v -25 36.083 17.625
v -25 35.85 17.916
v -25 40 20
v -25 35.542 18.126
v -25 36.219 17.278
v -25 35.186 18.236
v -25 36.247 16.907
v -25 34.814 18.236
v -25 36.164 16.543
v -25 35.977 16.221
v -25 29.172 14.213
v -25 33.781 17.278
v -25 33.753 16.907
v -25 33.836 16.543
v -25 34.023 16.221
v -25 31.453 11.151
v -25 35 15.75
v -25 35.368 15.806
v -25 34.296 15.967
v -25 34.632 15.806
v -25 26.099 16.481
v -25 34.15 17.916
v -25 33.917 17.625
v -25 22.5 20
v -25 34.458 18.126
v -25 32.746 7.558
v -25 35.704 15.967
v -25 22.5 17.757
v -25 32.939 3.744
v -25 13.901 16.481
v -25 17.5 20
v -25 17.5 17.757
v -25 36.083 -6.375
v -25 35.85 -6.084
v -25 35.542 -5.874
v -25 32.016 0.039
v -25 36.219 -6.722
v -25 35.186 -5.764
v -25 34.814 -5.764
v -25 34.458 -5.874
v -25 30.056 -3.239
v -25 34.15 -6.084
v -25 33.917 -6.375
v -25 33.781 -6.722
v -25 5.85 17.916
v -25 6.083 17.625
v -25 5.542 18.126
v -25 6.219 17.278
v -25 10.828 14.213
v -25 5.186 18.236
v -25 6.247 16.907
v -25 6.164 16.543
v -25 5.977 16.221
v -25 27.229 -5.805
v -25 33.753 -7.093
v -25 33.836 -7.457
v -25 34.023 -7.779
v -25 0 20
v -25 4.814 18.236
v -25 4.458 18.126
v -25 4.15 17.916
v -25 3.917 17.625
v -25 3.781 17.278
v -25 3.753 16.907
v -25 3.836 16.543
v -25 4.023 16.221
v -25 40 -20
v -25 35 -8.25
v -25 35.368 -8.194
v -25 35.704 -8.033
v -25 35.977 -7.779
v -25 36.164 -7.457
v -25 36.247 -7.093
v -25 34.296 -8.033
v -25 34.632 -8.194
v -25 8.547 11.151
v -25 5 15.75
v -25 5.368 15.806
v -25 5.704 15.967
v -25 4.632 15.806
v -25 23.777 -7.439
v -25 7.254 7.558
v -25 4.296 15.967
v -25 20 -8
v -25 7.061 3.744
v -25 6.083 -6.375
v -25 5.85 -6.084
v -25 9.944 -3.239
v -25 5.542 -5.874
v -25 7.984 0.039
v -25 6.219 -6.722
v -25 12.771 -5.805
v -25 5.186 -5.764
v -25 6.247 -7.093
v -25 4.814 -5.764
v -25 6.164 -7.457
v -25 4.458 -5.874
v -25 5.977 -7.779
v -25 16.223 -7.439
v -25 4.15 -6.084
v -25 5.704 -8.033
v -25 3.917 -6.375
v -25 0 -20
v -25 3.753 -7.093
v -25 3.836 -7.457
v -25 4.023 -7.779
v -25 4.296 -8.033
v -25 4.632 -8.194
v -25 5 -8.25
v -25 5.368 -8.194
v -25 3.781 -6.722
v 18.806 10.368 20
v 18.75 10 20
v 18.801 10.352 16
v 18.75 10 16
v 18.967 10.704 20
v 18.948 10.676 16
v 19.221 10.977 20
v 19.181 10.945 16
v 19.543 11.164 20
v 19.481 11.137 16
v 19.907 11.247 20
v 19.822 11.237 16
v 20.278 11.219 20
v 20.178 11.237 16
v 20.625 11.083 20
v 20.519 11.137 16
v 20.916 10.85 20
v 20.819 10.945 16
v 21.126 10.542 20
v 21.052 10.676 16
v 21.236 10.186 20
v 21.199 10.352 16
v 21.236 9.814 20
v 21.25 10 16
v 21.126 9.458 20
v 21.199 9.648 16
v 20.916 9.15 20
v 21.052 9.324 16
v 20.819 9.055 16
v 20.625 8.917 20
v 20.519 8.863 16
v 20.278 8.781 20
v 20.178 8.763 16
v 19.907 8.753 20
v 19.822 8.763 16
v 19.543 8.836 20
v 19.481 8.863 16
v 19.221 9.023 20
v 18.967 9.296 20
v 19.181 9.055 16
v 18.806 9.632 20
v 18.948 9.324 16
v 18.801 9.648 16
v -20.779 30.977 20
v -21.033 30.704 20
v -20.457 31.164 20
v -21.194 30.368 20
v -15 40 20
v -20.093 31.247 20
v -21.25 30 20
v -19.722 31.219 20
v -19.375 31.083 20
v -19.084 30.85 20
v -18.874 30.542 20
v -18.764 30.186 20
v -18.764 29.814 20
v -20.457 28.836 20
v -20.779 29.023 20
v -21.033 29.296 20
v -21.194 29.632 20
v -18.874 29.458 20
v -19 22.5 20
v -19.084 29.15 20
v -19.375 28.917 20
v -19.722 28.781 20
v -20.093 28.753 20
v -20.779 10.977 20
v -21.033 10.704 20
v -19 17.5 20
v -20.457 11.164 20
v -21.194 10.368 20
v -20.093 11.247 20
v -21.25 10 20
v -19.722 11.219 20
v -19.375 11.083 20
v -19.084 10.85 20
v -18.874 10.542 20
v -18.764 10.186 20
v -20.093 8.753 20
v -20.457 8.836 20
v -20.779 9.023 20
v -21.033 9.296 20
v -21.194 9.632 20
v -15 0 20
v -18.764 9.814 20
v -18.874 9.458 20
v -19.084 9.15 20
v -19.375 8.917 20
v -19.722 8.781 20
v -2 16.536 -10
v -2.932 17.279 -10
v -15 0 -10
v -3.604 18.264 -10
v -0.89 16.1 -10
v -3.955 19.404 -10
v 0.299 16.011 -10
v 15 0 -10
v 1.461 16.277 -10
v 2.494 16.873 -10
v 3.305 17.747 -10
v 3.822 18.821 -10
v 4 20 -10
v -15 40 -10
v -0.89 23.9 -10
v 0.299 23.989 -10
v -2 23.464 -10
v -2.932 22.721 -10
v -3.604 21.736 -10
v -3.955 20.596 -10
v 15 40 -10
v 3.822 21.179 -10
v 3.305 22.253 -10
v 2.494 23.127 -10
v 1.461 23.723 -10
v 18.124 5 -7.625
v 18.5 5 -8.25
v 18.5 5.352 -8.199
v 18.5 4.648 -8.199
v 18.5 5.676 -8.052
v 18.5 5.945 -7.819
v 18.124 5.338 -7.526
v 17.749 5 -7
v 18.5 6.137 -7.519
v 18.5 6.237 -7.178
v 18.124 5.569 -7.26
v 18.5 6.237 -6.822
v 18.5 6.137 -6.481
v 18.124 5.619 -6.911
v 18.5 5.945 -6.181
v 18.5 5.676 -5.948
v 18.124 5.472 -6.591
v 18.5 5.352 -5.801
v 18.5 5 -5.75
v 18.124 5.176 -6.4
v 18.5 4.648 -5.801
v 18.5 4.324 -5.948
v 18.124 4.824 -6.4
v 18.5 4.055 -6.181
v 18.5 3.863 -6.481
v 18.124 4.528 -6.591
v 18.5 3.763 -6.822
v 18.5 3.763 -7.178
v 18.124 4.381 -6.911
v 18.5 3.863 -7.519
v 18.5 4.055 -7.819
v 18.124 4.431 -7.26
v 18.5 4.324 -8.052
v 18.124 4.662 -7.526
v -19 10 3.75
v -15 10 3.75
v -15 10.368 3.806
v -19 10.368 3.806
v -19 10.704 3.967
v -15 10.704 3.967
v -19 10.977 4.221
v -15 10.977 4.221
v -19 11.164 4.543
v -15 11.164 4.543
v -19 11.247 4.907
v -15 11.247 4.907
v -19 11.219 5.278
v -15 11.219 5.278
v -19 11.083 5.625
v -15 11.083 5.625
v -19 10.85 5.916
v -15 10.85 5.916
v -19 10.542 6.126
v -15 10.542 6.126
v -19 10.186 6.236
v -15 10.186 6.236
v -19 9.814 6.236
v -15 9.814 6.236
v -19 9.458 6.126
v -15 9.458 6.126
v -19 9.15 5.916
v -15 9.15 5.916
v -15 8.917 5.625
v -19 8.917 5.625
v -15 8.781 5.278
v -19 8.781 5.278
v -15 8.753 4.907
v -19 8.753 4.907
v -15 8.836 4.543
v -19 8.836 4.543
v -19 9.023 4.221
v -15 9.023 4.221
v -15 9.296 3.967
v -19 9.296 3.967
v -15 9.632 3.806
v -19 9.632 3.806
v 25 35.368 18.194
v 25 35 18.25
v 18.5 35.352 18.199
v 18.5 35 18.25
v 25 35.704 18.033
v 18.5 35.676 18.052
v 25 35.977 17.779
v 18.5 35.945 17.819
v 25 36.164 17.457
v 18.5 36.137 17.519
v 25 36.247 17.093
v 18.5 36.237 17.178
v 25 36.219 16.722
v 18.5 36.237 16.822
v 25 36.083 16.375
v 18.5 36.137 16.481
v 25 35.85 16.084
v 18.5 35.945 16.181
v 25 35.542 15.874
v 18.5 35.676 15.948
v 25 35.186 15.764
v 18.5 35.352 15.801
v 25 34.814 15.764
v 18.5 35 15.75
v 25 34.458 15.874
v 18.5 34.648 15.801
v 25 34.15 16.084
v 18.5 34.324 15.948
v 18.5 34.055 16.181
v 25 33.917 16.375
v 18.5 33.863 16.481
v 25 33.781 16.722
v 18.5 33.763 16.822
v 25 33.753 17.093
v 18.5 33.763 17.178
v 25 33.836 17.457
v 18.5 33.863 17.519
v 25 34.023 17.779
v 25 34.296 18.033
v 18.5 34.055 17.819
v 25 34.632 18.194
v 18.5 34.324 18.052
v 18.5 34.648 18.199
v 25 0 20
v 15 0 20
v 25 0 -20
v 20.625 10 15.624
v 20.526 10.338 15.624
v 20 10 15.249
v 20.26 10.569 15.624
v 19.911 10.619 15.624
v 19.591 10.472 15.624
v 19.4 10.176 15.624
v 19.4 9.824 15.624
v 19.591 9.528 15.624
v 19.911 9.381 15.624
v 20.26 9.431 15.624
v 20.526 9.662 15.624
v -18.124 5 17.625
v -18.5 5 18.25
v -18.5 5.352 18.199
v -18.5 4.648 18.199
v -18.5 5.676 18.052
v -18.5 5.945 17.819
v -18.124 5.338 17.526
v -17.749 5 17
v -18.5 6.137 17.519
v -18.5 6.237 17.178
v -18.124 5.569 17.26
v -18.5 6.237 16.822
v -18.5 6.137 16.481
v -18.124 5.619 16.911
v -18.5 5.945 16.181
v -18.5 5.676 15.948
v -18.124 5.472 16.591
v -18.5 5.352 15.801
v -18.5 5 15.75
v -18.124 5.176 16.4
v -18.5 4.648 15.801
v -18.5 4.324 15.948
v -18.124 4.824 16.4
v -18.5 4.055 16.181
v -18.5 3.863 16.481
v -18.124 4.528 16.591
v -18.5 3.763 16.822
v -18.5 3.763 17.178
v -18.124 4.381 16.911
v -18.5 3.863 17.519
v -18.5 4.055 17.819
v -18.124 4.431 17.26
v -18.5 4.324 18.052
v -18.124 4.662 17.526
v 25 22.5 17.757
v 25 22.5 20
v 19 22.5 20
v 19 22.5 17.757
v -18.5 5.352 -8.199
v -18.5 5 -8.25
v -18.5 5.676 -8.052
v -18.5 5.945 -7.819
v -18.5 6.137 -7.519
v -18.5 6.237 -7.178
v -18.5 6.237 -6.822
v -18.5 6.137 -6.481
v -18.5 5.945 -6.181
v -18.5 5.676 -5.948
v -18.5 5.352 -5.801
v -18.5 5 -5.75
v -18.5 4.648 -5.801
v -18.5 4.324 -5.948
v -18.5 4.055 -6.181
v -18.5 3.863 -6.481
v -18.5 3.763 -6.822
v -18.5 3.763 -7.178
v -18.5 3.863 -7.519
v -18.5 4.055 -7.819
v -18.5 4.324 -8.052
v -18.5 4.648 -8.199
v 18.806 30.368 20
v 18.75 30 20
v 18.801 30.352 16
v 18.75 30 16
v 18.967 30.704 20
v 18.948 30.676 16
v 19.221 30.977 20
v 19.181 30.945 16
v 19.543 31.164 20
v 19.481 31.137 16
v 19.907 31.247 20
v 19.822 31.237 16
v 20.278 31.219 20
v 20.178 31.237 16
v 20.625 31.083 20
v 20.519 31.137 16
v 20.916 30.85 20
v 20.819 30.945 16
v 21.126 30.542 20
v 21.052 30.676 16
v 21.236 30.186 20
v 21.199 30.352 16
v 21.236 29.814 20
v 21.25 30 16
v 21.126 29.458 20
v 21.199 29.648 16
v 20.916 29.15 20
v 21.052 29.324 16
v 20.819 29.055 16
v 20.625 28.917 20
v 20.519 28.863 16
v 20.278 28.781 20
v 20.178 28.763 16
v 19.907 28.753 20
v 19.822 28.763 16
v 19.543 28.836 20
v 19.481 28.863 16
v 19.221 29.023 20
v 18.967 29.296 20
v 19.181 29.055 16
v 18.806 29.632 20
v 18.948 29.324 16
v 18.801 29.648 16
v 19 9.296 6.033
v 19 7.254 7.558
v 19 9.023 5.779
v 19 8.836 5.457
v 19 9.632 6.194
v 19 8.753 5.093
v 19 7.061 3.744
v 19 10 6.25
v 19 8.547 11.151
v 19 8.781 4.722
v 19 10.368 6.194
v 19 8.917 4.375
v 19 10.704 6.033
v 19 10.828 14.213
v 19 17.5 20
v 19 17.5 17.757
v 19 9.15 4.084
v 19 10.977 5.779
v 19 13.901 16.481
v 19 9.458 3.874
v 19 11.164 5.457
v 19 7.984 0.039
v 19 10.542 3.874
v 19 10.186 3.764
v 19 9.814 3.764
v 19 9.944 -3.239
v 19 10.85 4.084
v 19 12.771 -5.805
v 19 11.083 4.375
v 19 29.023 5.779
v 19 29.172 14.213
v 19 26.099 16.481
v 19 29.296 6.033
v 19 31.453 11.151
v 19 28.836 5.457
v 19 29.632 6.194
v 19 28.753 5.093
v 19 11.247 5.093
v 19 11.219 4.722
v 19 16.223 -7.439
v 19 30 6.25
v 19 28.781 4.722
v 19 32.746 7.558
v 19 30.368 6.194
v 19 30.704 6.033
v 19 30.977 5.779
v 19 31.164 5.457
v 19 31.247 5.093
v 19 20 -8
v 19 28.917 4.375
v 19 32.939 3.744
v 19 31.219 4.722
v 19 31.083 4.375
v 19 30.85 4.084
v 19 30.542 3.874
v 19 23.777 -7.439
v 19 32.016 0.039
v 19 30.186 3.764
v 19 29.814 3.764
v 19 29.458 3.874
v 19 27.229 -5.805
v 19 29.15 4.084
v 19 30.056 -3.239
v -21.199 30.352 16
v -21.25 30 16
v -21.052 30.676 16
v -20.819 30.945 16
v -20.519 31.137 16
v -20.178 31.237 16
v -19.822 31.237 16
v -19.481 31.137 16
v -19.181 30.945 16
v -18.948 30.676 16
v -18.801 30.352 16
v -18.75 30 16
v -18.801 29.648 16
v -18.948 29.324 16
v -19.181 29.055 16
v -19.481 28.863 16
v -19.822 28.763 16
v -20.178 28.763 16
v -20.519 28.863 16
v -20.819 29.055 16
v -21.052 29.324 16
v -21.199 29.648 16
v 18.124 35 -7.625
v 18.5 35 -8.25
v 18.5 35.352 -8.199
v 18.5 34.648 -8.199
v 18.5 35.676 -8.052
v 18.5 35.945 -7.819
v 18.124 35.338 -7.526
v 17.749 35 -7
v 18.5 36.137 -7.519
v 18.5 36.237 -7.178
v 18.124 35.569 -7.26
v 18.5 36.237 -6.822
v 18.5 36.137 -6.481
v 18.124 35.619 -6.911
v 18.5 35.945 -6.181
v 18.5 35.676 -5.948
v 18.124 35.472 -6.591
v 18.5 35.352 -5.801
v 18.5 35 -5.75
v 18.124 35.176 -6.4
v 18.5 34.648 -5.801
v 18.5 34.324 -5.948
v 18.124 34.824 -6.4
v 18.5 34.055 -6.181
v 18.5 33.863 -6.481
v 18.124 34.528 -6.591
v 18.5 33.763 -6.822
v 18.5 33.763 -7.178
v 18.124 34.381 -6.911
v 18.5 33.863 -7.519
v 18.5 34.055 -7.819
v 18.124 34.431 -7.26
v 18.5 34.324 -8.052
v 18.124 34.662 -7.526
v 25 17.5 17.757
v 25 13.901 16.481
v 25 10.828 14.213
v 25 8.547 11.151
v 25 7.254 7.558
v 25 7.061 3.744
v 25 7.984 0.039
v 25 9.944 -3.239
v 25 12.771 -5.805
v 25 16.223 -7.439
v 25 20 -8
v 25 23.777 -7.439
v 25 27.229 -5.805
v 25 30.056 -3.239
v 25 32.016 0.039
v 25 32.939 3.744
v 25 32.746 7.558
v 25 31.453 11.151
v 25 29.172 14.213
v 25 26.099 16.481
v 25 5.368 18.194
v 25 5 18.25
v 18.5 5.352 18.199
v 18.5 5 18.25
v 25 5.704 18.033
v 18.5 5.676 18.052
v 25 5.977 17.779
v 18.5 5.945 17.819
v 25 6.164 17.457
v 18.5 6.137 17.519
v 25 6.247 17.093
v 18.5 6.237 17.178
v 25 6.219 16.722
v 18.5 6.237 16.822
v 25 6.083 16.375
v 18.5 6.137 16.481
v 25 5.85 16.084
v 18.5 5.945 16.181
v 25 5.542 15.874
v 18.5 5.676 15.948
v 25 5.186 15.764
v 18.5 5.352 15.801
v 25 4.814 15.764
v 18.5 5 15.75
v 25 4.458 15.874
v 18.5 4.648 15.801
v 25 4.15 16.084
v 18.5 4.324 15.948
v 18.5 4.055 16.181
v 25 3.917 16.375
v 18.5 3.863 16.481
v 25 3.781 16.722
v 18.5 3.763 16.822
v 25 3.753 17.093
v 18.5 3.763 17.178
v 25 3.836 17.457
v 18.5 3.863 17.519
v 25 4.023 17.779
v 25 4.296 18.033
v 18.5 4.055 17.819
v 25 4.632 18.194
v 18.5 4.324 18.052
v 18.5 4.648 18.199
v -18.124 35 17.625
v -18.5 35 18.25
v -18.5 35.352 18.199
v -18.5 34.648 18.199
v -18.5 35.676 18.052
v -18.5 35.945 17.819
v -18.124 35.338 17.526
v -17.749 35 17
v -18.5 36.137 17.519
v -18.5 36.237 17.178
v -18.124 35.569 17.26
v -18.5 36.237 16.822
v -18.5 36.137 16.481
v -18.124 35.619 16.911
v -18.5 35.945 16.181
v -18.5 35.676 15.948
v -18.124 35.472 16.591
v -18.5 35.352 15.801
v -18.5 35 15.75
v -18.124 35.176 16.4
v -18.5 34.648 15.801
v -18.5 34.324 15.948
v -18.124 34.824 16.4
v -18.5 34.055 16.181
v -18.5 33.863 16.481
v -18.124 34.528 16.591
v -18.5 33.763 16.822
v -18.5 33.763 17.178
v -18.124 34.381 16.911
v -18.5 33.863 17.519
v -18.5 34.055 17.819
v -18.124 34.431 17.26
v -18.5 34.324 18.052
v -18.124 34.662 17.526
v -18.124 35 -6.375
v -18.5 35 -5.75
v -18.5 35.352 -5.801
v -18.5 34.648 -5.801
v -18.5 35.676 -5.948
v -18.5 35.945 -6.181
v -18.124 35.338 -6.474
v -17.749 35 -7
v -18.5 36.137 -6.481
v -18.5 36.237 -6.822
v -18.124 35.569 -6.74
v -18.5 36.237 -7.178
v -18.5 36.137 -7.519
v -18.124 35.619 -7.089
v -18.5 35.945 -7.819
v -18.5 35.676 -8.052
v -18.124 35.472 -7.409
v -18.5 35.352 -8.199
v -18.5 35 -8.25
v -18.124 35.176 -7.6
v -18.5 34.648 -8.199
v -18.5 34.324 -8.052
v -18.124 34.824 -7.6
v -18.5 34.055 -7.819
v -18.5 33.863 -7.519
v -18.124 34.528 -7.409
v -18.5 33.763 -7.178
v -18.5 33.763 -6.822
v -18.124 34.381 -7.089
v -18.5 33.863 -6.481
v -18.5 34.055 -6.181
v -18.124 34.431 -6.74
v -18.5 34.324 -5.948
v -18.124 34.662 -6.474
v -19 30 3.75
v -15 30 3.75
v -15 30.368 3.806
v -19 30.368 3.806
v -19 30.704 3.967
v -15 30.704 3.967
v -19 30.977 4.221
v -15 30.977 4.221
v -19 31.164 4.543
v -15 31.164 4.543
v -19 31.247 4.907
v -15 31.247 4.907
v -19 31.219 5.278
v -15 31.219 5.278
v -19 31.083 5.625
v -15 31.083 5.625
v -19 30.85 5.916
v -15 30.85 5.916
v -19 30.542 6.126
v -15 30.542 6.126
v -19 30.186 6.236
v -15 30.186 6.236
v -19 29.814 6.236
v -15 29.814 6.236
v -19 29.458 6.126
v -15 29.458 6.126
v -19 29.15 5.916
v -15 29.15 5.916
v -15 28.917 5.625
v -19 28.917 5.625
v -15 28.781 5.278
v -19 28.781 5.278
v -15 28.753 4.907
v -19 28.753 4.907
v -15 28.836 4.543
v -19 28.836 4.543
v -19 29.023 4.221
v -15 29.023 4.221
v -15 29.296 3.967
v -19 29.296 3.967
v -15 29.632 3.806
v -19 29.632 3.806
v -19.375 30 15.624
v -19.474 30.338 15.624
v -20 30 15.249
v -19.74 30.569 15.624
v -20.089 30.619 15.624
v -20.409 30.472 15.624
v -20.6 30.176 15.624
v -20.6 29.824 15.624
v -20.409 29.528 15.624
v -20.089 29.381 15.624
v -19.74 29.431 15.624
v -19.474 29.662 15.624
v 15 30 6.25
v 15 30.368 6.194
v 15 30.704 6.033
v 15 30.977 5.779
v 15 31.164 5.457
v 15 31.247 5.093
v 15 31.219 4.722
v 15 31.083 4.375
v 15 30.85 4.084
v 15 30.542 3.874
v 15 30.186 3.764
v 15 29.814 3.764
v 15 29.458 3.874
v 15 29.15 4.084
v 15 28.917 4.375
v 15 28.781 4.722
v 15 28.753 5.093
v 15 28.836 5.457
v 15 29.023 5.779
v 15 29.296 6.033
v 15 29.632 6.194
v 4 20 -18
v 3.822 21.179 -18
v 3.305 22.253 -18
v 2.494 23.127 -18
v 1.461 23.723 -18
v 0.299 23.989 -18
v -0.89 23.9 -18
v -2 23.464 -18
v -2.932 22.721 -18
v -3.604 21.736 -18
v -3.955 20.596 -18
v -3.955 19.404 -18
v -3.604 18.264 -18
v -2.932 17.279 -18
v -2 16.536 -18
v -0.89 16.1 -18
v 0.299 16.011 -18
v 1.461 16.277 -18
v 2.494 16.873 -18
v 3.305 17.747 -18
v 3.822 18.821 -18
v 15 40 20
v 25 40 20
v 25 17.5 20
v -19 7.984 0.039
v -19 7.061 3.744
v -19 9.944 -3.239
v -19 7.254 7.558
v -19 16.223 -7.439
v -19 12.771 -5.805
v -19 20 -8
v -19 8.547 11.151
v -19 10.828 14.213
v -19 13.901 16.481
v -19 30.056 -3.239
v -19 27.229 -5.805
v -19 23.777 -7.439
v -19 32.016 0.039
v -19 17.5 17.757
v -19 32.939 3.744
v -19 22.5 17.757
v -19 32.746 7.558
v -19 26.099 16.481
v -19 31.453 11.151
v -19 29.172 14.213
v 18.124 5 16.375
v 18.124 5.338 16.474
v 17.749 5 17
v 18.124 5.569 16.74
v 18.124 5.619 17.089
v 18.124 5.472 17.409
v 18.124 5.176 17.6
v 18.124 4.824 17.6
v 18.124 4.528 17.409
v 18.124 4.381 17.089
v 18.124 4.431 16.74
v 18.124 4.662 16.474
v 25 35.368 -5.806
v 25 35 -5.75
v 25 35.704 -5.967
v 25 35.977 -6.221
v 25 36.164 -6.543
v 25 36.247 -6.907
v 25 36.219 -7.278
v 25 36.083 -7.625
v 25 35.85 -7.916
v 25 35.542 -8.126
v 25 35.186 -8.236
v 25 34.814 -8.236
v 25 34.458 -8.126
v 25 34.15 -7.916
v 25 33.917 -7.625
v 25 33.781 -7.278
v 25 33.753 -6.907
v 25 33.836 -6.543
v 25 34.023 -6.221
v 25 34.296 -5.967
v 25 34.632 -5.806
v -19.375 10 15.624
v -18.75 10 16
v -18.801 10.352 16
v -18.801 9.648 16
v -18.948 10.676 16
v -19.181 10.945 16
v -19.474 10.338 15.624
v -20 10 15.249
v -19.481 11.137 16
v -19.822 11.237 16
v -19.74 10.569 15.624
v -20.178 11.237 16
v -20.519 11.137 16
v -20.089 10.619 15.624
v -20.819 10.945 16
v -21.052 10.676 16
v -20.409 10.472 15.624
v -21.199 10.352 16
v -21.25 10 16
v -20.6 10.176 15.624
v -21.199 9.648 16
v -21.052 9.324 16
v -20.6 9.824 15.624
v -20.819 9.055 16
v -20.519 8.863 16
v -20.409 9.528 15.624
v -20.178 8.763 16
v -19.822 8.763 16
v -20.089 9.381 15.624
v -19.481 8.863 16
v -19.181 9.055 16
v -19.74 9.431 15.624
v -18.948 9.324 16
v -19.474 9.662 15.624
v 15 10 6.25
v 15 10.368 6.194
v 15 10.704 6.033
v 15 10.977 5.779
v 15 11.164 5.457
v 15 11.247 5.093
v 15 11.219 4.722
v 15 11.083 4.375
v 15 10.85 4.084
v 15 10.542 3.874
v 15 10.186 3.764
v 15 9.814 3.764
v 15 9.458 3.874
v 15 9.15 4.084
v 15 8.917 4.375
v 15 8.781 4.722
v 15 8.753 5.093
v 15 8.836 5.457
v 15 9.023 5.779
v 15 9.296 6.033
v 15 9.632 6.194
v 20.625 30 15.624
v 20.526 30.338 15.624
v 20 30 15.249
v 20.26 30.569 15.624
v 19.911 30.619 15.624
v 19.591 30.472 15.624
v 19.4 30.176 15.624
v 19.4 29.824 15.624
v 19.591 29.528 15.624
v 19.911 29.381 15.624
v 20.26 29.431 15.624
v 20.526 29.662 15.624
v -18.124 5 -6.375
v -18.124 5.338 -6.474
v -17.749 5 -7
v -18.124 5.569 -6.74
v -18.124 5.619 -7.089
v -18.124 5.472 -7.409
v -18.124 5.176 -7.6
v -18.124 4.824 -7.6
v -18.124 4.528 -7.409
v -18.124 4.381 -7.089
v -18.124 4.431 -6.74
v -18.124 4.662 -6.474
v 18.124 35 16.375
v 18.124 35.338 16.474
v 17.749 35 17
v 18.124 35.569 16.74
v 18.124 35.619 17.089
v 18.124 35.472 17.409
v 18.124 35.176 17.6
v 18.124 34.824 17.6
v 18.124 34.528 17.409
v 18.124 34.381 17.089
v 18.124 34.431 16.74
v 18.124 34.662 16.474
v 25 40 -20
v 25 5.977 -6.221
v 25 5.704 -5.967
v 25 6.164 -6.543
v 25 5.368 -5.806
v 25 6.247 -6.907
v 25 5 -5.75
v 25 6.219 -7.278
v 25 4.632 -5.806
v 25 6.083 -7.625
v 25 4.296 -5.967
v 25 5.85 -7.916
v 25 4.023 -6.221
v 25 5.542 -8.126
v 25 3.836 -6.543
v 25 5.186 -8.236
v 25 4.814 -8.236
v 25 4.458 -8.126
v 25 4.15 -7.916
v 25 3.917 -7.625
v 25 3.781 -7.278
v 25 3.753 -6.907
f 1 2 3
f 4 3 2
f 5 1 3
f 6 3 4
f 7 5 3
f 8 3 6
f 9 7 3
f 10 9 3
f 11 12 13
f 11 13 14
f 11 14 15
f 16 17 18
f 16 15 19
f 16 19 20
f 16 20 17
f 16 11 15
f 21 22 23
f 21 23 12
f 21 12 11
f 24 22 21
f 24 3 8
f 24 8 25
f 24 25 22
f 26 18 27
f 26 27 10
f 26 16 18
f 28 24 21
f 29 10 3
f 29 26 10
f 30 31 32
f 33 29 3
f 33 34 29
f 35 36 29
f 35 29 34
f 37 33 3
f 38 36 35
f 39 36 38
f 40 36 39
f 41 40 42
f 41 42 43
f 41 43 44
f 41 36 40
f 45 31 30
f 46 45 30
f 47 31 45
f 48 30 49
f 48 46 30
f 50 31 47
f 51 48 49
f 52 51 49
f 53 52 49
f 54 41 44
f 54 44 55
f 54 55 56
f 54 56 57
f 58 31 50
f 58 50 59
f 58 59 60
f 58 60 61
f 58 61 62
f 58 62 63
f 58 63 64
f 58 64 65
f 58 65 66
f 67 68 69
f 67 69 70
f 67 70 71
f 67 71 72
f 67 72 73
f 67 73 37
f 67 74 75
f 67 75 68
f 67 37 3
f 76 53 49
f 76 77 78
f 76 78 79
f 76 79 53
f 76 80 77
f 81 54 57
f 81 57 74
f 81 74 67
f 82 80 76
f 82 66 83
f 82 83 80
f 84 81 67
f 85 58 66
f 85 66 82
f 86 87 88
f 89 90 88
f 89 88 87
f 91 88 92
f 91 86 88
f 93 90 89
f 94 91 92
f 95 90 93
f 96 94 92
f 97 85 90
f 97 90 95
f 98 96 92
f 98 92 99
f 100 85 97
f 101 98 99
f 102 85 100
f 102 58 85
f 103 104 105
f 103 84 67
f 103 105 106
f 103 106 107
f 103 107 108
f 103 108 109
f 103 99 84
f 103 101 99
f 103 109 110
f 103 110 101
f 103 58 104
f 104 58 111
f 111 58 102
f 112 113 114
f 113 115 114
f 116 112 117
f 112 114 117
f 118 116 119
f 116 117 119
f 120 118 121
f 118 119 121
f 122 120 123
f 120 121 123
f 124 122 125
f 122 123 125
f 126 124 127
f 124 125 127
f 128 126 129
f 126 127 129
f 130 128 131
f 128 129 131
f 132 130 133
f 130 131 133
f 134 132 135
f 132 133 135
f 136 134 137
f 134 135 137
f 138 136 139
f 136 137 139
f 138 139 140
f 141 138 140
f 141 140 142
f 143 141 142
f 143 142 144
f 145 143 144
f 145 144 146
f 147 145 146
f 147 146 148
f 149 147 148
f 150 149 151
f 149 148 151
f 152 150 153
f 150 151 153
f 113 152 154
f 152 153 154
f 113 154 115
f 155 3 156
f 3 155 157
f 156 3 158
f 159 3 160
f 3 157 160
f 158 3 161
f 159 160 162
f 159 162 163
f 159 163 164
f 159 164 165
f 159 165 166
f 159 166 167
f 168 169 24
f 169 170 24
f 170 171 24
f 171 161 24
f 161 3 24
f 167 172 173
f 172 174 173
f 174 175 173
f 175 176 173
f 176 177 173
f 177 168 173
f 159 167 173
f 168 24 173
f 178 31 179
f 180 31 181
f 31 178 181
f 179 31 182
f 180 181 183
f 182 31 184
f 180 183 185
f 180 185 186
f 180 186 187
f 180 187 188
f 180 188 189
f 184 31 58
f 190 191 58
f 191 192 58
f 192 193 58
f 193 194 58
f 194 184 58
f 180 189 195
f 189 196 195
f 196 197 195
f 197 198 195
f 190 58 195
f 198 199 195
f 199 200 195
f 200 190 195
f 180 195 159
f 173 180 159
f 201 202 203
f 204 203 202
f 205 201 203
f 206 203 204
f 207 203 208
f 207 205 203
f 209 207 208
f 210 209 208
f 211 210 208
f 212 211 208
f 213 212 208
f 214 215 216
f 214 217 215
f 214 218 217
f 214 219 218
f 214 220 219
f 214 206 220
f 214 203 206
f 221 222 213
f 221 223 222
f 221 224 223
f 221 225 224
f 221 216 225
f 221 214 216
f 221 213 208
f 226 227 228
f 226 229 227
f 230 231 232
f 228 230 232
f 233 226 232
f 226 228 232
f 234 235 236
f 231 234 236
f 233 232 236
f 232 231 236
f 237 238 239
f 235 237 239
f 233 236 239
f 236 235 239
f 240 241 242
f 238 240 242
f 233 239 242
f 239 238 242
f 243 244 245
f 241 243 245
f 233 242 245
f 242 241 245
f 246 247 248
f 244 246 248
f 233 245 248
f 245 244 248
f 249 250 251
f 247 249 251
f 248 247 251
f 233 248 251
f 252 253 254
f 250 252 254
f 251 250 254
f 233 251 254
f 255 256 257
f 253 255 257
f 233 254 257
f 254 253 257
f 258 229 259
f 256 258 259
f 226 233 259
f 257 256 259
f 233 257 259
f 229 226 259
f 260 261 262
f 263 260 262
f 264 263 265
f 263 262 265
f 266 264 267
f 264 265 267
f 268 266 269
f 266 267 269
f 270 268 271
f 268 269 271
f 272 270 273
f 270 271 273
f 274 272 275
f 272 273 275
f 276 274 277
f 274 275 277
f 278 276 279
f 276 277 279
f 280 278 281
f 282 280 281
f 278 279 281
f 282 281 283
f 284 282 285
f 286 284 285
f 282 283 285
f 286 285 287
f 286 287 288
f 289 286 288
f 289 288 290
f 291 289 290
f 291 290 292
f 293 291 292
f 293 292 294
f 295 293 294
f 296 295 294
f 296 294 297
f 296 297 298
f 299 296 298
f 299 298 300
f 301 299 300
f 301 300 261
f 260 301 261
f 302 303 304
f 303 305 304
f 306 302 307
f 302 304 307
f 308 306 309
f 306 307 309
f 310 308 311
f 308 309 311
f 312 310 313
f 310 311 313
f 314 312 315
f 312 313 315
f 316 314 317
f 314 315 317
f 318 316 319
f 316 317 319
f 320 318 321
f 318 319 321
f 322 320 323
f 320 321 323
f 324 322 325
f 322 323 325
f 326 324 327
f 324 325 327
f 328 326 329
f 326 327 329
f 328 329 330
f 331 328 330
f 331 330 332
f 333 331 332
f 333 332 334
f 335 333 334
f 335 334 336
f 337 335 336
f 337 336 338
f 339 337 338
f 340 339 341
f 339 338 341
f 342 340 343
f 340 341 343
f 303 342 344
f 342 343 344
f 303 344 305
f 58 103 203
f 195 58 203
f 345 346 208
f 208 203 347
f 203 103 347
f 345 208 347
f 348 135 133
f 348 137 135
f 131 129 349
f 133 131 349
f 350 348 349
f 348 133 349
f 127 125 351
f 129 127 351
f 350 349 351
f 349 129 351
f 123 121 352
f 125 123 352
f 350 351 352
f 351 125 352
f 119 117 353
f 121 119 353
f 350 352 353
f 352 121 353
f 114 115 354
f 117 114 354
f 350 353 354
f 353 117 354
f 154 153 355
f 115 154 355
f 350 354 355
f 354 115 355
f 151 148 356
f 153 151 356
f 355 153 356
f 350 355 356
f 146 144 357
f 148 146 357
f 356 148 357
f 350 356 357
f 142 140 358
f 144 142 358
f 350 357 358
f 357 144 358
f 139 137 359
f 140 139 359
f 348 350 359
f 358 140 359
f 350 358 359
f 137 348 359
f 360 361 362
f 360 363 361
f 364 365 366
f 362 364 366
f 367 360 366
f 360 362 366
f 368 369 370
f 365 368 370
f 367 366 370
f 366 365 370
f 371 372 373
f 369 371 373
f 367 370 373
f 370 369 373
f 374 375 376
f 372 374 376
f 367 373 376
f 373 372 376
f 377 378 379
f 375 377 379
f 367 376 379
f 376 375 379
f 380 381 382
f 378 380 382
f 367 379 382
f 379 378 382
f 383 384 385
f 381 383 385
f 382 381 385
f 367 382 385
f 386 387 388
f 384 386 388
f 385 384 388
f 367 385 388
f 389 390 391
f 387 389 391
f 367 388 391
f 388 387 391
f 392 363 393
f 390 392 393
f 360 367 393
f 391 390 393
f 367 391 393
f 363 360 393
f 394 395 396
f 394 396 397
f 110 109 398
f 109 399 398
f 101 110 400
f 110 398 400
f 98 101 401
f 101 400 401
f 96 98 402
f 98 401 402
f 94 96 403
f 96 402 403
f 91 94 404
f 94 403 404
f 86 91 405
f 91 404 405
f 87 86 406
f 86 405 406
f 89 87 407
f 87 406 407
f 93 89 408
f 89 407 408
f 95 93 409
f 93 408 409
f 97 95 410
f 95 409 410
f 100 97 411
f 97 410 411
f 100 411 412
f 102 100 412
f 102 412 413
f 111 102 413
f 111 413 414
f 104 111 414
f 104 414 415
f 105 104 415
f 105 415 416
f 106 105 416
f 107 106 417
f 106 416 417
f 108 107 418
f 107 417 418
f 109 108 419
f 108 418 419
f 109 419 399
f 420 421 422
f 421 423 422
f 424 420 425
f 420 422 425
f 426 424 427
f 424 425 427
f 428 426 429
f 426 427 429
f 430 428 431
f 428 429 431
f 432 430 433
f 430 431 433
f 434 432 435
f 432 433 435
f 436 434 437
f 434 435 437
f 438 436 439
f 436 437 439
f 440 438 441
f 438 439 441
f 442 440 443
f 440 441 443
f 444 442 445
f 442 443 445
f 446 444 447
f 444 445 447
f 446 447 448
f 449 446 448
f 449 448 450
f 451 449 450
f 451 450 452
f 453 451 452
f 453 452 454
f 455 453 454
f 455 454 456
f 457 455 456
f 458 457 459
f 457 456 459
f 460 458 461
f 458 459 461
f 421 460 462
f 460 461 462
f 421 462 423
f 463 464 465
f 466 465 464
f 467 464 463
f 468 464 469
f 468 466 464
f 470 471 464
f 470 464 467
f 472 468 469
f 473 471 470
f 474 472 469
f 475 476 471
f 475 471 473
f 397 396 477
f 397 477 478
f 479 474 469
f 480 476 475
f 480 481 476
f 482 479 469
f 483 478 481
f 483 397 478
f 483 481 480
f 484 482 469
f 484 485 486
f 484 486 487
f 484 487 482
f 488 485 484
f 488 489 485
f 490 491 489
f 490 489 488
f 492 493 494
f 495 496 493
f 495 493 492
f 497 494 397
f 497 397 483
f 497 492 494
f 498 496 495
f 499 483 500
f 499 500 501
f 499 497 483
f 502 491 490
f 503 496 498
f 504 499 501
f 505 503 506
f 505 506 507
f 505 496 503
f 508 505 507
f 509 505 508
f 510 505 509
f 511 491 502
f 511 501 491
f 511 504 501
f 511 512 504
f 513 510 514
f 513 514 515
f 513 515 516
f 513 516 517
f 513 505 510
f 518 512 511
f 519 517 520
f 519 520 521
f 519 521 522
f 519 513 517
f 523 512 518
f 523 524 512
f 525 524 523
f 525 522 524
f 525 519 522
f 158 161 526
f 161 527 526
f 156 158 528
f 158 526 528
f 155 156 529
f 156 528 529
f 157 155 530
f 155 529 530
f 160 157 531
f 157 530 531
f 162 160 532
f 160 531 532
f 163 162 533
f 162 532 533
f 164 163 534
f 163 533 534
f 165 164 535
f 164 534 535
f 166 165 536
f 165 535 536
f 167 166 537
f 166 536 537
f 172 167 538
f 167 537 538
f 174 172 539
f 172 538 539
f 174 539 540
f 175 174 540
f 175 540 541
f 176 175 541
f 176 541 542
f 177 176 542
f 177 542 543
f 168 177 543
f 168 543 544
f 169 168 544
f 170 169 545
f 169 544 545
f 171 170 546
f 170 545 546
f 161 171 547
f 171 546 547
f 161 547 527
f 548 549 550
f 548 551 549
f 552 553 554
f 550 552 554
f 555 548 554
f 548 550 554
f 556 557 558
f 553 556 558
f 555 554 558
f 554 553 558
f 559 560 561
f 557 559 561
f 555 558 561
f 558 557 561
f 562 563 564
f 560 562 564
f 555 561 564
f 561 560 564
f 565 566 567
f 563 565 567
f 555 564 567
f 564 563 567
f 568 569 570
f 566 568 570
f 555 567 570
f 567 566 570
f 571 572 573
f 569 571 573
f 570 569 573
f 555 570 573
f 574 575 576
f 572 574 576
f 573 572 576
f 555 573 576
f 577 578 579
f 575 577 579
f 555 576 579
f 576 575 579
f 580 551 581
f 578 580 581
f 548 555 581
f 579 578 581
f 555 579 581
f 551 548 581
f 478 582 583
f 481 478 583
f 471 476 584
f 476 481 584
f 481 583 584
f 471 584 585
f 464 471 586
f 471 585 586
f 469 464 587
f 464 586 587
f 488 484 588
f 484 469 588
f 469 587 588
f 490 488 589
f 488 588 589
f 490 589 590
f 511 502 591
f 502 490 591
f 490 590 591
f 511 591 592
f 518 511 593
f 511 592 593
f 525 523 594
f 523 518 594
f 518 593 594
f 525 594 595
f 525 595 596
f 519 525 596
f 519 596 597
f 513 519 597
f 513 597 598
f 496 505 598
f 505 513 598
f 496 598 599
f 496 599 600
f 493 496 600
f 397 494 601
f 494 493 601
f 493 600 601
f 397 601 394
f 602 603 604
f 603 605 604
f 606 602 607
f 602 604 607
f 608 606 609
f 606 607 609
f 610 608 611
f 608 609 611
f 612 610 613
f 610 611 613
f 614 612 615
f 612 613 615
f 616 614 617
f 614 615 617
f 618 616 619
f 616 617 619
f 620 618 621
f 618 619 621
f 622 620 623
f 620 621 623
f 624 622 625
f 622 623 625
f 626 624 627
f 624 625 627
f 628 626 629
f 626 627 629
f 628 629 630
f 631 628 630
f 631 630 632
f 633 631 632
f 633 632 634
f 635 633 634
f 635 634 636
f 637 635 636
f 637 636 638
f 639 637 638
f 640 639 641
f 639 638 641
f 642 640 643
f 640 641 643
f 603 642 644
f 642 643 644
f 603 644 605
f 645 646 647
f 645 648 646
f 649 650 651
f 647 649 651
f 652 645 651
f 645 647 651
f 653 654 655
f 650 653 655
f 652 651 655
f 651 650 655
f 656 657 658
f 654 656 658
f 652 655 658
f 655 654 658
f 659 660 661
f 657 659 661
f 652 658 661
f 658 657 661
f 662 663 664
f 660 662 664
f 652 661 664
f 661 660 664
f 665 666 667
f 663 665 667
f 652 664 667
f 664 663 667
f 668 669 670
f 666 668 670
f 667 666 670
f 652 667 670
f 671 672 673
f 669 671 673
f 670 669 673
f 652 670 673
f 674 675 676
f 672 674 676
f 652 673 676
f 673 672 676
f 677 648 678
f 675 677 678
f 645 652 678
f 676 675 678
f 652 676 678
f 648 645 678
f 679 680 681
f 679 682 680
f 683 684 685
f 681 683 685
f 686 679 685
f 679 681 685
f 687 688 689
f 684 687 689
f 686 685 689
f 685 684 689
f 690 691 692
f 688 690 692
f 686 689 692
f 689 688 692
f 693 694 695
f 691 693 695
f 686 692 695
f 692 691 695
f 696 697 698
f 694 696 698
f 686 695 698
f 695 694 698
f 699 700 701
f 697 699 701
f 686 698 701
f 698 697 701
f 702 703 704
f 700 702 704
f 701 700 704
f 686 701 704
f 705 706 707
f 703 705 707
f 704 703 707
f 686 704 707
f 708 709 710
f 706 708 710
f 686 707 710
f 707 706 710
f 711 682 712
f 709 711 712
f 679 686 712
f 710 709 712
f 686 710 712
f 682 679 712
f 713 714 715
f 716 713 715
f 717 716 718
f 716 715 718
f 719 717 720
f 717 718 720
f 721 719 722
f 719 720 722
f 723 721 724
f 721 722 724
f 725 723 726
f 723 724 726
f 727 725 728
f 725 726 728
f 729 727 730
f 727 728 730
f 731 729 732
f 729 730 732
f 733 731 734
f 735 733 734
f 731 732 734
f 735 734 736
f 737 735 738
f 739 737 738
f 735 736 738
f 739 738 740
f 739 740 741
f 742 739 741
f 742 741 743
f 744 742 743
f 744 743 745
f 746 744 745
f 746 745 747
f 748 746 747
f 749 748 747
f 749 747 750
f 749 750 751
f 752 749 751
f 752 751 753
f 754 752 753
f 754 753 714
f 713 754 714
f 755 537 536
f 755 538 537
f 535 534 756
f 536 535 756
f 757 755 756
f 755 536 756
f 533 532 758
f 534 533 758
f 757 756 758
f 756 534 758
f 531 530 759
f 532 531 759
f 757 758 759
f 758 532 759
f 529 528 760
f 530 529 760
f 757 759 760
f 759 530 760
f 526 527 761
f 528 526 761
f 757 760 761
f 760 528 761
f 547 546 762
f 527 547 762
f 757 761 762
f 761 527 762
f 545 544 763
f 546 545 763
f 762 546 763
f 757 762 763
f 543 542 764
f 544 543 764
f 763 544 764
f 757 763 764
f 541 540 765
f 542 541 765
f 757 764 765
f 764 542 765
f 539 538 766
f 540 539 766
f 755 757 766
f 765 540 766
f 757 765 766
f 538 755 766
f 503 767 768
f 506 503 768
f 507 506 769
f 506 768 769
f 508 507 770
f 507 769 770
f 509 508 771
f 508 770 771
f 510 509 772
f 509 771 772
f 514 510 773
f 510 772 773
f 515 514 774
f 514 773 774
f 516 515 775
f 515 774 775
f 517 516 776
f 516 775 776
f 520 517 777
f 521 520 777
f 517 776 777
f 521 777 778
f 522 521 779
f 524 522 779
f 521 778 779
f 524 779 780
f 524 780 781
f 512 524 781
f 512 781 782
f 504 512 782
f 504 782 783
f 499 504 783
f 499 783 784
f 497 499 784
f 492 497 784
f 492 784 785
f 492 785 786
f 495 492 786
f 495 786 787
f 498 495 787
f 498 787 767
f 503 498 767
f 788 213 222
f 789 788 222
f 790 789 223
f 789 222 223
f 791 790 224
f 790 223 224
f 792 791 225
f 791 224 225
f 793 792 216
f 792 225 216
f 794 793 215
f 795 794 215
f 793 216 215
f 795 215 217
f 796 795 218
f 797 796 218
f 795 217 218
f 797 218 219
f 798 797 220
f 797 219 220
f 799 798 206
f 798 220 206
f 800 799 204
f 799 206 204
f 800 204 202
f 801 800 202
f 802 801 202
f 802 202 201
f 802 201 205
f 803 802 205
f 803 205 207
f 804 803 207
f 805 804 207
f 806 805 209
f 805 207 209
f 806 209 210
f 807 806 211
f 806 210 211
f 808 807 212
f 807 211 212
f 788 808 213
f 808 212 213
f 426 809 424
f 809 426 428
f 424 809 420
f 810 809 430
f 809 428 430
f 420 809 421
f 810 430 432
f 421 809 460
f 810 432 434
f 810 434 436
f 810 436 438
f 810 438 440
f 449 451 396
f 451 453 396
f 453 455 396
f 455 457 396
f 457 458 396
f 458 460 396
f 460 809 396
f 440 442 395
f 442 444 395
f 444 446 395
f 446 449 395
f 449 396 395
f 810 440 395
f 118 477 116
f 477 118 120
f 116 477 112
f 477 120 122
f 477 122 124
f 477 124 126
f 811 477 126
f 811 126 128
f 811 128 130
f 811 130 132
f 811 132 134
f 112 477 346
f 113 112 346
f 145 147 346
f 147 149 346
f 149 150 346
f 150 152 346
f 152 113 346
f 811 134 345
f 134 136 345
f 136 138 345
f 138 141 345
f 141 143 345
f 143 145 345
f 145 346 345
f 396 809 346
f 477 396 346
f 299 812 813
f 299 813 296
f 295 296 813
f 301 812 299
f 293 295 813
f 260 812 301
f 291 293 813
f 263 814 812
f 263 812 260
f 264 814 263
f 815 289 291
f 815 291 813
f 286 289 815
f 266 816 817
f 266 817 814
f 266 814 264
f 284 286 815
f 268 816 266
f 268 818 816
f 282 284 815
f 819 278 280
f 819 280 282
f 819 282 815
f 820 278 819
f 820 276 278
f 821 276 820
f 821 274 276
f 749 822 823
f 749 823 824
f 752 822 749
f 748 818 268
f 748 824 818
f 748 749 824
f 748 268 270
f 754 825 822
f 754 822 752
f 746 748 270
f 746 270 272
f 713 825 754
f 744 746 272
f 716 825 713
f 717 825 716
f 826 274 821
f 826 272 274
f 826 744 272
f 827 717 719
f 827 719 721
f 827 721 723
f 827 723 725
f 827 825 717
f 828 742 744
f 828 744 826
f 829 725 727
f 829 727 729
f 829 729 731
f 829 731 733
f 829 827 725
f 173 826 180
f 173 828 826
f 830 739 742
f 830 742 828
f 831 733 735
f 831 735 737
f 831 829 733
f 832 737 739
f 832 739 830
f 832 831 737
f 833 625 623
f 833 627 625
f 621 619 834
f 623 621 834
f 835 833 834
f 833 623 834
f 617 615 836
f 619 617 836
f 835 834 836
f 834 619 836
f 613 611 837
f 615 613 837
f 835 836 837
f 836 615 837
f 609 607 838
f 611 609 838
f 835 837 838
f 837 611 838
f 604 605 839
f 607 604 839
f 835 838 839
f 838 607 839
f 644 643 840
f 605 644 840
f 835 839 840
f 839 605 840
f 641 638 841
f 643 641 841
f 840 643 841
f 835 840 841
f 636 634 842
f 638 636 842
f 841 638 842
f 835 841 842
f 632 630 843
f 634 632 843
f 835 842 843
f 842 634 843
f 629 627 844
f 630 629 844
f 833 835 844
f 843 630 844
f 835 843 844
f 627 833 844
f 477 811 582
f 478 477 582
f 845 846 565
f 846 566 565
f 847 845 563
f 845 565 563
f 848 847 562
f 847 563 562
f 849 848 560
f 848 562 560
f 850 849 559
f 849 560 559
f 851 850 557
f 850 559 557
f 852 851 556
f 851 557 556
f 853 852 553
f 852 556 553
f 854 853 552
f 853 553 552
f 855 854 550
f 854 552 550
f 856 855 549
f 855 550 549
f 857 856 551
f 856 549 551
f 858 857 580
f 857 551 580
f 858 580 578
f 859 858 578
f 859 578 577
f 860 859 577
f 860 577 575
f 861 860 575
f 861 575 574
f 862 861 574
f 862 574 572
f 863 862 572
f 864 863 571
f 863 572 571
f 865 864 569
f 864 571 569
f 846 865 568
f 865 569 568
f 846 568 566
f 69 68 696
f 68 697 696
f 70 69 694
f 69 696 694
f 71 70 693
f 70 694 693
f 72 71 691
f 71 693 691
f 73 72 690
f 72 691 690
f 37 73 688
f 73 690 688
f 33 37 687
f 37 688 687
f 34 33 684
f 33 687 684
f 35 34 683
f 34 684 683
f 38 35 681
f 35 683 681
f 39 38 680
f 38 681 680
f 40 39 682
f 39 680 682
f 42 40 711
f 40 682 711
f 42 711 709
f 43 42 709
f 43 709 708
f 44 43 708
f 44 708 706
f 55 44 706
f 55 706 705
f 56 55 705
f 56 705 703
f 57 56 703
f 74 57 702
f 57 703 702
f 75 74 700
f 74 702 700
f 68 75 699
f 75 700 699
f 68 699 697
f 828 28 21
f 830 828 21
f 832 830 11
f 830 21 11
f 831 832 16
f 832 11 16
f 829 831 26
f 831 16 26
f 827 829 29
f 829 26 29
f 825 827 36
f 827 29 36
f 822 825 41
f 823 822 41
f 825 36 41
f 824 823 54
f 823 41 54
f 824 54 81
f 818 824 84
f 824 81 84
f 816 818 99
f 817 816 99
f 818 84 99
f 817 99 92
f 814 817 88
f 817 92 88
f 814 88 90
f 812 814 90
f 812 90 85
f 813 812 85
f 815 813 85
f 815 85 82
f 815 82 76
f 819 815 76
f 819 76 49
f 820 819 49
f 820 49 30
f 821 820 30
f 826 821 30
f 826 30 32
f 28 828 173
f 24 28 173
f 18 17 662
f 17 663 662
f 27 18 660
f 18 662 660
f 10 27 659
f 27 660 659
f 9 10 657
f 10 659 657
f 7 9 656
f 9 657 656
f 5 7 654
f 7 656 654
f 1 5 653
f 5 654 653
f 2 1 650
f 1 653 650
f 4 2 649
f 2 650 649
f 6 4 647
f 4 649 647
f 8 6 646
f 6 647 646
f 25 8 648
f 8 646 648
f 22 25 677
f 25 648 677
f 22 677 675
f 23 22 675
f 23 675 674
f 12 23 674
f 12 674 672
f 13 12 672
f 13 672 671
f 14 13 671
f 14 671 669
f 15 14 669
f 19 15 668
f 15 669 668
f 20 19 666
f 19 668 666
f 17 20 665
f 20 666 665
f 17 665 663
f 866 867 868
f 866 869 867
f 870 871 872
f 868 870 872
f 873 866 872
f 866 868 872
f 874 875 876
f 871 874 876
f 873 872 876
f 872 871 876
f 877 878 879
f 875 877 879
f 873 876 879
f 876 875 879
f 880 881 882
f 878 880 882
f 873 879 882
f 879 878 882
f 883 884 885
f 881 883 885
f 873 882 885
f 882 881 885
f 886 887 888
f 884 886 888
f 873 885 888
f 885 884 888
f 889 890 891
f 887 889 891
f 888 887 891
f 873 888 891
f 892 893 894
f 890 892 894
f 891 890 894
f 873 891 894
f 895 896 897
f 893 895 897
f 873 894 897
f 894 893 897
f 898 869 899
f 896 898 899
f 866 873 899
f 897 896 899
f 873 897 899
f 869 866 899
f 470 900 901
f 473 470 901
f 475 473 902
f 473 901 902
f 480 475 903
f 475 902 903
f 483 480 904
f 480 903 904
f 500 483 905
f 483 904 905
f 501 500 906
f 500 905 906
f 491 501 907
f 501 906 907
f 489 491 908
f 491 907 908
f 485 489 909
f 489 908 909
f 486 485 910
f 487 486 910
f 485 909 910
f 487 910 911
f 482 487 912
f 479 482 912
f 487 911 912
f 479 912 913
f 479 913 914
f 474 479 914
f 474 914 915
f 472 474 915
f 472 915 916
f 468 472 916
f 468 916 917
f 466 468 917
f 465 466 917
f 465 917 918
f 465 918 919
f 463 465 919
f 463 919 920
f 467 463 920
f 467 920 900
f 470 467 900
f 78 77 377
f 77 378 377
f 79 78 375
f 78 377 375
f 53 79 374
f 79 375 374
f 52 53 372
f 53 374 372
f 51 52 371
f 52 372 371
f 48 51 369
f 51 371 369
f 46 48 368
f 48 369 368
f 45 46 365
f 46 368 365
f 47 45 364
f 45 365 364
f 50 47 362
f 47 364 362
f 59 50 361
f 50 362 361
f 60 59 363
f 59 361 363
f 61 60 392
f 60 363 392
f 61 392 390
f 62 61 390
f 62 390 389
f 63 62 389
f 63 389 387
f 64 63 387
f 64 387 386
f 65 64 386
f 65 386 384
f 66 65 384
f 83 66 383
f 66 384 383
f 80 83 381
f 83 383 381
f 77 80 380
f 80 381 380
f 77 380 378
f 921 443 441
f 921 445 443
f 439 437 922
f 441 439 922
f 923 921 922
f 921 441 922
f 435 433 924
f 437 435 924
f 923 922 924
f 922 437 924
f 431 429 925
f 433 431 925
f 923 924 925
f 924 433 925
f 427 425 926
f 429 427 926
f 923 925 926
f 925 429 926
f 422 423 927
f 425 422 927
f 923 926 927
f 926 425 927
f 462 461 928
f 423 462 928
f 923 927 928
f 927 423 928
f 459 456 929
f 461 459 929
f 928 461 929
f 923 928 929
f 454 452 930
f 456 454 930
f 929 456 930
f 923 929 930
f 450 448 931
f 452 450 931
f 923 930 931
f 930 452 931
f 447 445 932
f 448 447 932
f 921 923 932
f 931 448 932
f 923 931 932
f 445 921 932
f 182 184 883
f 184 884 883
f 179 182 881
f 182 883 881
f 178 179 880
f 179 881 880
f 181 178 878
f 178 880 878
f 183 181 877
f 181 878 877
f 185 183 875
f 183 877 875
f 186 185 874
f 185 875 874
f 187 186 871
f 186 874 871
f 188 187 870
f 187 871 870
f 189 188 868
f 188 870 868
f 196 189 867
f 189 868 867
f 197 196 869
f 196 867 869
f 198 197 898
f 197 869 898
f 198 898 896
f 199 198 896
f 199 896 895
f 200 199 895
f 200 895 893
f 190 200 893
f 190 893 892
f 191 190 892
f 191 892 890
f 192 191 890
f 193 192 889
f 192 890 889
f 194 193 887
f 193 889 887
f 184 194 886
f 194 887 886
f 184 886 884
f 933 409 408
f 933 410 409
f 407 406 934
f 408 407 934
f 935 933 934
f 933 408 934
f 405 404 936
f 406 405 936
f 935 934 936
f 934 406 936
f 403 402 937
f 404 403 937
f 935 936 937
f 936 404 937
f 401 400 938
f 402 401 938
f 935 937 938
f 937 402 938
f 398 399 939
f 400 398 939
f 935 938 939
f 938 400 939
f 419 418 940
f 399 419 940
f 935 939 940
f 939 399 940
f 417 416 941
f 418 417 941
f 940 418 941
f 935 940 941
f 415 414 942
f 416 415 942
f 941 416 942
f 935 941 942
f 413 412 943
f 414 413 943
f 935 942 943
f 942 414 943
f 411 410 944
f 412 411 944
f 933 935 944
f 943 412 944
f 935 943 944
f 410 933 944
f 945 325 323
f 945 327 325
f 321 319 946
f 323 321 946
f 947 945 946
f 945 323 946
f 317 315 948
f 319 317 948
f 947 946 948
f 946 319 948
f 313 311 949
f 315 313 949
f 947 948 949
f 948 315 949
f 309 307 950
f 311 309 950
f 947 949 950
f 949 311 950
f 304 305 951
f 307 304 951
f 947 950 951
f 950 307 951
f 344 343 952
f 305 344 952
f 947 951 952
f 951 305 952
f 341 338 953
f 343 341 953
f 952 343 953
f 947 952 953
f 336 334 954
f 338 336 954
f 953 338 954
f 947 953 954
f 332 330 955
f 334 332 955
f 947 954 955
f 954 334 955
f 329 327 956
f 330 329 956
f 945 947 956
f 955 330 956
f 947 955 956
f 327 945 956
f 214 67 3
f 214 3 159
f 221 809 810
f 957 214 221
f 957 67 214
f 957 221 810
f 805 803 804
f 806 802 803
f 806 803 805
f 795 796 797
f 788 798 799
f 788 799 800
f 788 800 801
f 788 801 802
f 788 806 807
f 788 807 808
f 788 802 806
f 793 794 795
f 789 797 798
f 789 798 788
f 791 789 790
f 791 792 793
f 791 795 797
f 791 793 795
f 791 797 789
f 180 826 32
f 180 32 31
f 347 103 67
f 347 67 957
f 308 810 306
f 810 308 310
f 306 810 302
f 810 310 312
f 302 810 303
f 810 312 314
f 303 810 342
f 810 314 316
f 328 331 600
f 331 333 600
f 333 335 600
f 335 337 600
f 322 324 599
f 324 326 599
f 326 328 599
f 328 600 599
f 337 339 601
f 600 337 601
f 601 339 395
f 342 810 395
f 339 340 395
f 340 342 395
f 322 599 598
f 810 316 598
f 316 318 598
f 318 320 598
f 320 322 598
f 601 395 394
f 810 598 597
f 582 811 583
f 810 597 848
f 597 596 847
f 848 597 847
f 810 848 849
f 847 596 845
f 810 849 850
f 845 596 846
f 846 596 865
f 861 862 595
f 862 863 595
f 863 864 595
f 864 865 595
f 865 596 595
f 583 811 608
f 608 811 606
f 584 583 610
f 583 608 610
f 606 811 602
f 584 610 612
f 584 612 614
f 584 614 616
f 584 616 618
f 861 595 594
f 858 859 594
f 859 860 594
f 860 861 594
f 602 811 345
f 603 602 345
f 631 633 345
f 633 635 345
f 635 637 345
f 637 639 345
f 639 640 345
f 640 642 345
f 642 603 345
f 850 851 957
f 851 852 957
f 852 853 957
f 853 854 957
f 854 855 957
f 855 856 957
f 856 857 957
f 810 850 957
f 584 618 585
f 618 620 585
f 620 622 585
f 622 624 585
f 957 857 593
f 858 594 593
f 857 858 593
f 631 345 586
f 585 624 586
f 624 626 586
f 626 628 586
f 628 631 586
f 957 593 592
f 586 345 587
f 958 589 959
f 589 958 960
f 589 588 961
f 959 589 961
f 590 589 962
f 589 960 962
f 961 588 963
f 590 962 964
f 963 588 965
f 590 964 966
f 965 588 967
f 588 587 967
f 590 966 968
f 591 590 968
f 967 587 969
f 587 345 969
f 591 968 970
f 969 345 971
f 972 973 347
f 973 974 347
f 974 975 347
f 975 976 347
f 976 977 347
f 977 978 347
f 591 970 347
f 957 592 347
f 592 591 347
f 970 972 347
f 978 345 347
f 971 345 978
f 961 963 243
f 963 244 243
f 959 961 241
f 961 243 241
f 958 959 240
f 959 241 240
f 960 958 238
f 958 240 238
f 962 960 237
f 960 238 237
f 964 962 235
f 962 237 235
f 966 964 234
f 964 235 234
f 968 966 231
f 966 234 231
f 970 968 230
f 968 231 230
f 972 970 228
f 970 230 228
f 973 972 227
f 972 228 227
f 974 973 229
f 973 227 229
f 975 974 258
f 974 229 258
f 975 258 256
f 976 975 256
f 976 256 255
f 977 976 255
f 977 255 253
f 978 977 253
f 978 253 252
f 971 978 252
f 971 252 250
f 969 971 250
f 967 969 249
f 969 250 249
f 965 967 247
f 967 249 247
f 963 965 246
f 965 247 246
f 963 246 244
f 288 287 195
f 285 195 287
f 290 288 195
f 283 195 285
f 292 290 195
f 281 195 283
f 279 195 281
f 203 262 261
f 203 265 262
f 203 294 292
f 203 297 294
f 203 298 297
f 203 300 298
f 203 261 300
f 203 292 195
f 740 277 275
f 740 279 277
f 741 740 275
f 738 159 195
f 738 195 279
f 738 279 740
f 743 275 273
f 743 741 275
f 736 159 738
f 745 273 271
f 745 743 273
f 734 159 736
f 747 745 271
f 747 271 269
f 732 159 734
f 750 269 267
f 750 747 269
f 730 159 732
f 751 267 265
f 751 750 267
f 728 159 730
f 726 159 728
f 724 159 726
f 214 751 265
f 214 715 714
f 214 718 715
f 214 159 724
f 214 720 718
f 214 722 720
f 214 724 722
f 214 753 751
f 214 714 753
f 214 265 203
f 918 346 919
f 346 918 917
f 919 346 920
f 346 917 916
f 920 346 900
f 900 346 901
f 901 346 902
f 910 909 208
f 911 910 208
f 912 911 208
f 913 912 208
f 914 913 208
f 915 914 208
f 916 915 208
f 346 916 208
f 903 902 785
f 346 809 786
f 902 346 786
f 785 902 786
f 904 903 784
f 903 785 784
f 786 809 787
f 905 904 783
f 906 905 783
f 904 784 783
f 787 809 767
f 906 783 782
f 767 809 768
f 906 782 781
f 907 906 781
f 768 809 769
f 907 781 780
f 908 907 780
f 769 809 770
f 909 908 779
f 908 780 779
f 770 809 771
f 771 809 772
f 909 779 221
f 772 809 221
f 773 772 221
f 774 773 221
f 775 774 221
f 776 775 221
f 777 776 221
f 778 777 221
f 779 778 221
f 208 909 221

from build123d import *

# Parameters (mm, degrees)
SKETCH1_W                 = 50
SKETCH1_H                 = 40
BOSS_EXTRUDE1_DEPTH       = 40
CUT_EXTRUDE1_REACH        = 42
SKETCH2_W                 = 30
SKETCH2_H                 = 30
SKETCH3_R                 = 13
CUT_EXTRUDE2_DEPTH        = 6
SKETCH4_R                 = 13
CUT_EXTRUDE3_DEPTH        = 6
M3X0_5_TAPPED_HOLE1_D     = 2.5
M3X0_5_TAPPED_HOLE1_DEPTH = 6.5
M3X0_5_TAPPED_HOLE1_TIP   = 0.751075774
M3X0_5_TAPPED_HOLE2_D     = 2.5
M3X0_5_TAPPED_HOLE2_DEPTH = 6.5
M3X0_5_TAPPED_HOLE2_TIP   = 0.751075774
M3X0_5_TAPPED_HOLE3_D     = 2.5
M3X0_5_TAPPED_HOLE3_DEPTH = 4
M3X0_5_TAPPED_HOLE3_TIP   = 0.751075774
SKETCH13_R                = 4
CUT_EXTRUDE4_DEPTH        = 8
SKETCH15_W                = 4
SKETCH15_H                = 5
CUT_EXTRUDE5_DEPTH        = 6
SKETCH16_W                = 4
SKETCH16_H                = 5
CUT_EXTRUDE6_DEPTH        = 6
M3X0_5_TAPPED_HOLE4_D     = 2.5
M3X0_5_TAPPED_HOLE4_DEPTH = 6.5
M3X0_5_TAPPED_HOLE4_TIP   = 0.751075774
M3X0_5_TAPPED_HOLE5_D     = 2.5
M3X0_5_TAPPED_HOLE5_DEPTH = 6.5
M3X0_5_TAPPED_HOLE5_TIP   = 0.751075774


with BuildPart() as part:
    # Sketch1 → Boss-Extrude1 (new body)
    with BuildSketch(Plane(origin=(0, 0, 0), x_dir=(1, 0, 0), z_dir=(0, 1, 0))):
        Rectangle(SKETCH1_W, SKETCH1_H)
    extrude(amount=BOSS_EXTRUDE1_DEPTH)

    # Sketch2 → Cut-Extrude1 (cut, up to next)
    with BuildSketch(Plane(origin=(0, 40, 0), x_dir=(1, 0, 0), z_dir=(0, 1, 0)), mode=Mode.PRIVATE) as cut_extrude1_sk1:
        with Locations((0, -5)):
            Rectangle(SKETCH2_W, SKETCH2_H)
    cut_extrude1_tool1 = extrude(cut_extrude1_sk1.sketch, amount=-CUT_EXTRUDE1_REACH, mode=Mode.PRIVATE) & part.part
    add(cut_extrude1_tool1.solids().sort_by_distance((0, 40, 5))[0], mode=Mode.SUBTRACT)

    # Sketch3 → Cut-Extrude2 (cut)
    with BuildSketch(Plane.ZY.offset(25)):
        with Locations((5, 20)):
            Circle(SKETCH3_R)
    extrude(amount=-CUT_EXTRUDE2_DEPTH, mode=Mode.SUBTRACT)

    # Sketch4 → Cut-Extrude3 (cut)
    with BuildSketch(Plane(origin=(25, 0, 0), x_dir=(0, 0, -1), z_dir=(1, 0, 0))):
        with Locations((-5, 20)):
            Circle(SKETCH4_R)
    extrude(amount=-CUT_EXTRUDE3_DEPTH, mode=Mode.SUBTRACT)

    # M3x0.5 Tapped Hole1
    with Locations(Plane.ZY.offset(19)):
        with Locations((5, 30), (5, 10)):
            Hole(M3X0_5_TAPPED_HOLE1_D / 2, depth=M3X0_5_TAPPED_HOLE1_DEPTH)
            with Locations((0, 0, -(M3X0_5_TAPPED_HOLE1_DEPTH + M3X0_5_TAPPED_HOLE1_TIP / 2))):  # 118° drill point
                Cone(0, M3X0_5_TAPPED_HOLE1_D / 2, M3X0_5_TAPPED_HOLE1_TIP, mode=Mode.SUBTRACT)

    # M3x0.5 Tapped Hole2
    with Locations(Plane(origin=(19, 0, 0), x_dir=(0, 0, -1), z_dir=(1, 0, 0))):
        with Locations((-5, 30), (-5, 10)):
            Hole(M3X0_5_TAPPED_HOLE2_D / 2, depth=M3X0_5_TAPPED_HOLE2_DEPTH)
            with Locations((0, 0, -(M3X0_5_TAPPED_HOLE2_DEPTH + M3X0_5_TAPPED_HOLE2_TIP / 2))):  # 118° drill point
                Cone(0, M3X0_5_TAPPED_HOLE2_D / 2, M3X0_5_TAPPED_HOLE2_TIP, mode=Mode.SUBTRACT)

    # M3x0.5 Tapped Hole3
    with Locations(Plane.XY.offset(20)):
        with Locations((-20, 30), (-20, 10), (20, 10), (20, 30)):
            Hole(M3X0_5_TAPPED_HOLE3_D / 2, depth=M3X0_5_TAPPED_HOLE3_DEPTH)
            with Locations((0, 0, -(M3X0_5_TAPPED_HOLE3_DEPTH + M3X0_5_TAPPED_HOLE3_TIP / 2))):  # 118° drill point
                Cone(0, M3X0_5_TAPPED_HOLE3_D / 2, M3X0_5_TAPPED_HOLE3_TIP, mode=Mode.SUBTRACT)

    # Sketch13 → Cut-Extrude4 (cut)
    with BuildSketch(Plane.XY.offset(-10)):
        with Locations((0, 20)):
            Circle(SKETCH13_R)
    extrude(amount=-CUT_EXTRUDE4_DEPTH, mode=Mode.SUBTRACT)

    # Sketch15 → Cut-Extrude5 (cut)
    with BuildSketch(Plane(origin=(25, 0, 0), x_dir=(0, 0, -1), z_dir=(1, 0, 0))):
        with Locations((-18, 20)):
            Rectangle(SKETCH15_W, SKETCH15_H)
    extrude(amount=-CUT_EXTRUDE5_DEPTH, mode=Mode.SUBTRACT)

    # Sketch16 → Cut-Extrude6 (cut)
    with BuildSketch(Plane.ZY.offset(25)):
        with Locations((18, 20)):
            Rectangle(SKETCH16_W, SKETCH16_H)
    extrude(amount=-CUT_EXTRUDE6_DEPTH, mode=Mode.SUBTRACT)

    # M3x0.5 Tapped Hole4
    with Locations(Plane.ZY.offset(25)):
        with Locations((-7, 35), (-7, 5), (17, 5), (17, 35)):
            Hole(M3X0_5_TAPPED_HOLE4_D / 2, depth=M3X0_5_TAPPED_HOLE4_DEPTH)
            with Locations((0, 0, -(M3X0_5_TAPPED_HOLE4_DEPTH + M3X0_5_TAPPED_HOLE4_TIP / 2))):  # 118° drill point
                Cone(0, M3X0_5_TAPPED_HOLE4_D / 2, M3X0_5_TAPPED_HOLE4_TIP, mode=Mode.SUBTRACT)

    # M3x0.5 Tapped Hole5
    with Locations(Plane(origin=(25, 0, 0), x_dir=(0, 0, -1), z_dir=(1, 0, 0))):
        with Locations((-17, 35), (7, 35), (7, 5), (-17, 5)):
            Hole(M3X0_5_TAPPED_HOLE5_D / 2, depth=M3X0_5_TAPPED_HOLE5_DEPTH)
            with Locations((0, 0, -(M3X0_5_TAPPED_HOLE5_DEPTH + M3X0_5_TAPPED_HOLE5_TIP / 2))):  # 118° drill point
                Cone(0, M3X0_5_TAPPED_HOLE5_D / 2, M3X0_5_TAPPED_HOLE5_TIP, mode=Mode.SUBTRACT)


solid = part.part
